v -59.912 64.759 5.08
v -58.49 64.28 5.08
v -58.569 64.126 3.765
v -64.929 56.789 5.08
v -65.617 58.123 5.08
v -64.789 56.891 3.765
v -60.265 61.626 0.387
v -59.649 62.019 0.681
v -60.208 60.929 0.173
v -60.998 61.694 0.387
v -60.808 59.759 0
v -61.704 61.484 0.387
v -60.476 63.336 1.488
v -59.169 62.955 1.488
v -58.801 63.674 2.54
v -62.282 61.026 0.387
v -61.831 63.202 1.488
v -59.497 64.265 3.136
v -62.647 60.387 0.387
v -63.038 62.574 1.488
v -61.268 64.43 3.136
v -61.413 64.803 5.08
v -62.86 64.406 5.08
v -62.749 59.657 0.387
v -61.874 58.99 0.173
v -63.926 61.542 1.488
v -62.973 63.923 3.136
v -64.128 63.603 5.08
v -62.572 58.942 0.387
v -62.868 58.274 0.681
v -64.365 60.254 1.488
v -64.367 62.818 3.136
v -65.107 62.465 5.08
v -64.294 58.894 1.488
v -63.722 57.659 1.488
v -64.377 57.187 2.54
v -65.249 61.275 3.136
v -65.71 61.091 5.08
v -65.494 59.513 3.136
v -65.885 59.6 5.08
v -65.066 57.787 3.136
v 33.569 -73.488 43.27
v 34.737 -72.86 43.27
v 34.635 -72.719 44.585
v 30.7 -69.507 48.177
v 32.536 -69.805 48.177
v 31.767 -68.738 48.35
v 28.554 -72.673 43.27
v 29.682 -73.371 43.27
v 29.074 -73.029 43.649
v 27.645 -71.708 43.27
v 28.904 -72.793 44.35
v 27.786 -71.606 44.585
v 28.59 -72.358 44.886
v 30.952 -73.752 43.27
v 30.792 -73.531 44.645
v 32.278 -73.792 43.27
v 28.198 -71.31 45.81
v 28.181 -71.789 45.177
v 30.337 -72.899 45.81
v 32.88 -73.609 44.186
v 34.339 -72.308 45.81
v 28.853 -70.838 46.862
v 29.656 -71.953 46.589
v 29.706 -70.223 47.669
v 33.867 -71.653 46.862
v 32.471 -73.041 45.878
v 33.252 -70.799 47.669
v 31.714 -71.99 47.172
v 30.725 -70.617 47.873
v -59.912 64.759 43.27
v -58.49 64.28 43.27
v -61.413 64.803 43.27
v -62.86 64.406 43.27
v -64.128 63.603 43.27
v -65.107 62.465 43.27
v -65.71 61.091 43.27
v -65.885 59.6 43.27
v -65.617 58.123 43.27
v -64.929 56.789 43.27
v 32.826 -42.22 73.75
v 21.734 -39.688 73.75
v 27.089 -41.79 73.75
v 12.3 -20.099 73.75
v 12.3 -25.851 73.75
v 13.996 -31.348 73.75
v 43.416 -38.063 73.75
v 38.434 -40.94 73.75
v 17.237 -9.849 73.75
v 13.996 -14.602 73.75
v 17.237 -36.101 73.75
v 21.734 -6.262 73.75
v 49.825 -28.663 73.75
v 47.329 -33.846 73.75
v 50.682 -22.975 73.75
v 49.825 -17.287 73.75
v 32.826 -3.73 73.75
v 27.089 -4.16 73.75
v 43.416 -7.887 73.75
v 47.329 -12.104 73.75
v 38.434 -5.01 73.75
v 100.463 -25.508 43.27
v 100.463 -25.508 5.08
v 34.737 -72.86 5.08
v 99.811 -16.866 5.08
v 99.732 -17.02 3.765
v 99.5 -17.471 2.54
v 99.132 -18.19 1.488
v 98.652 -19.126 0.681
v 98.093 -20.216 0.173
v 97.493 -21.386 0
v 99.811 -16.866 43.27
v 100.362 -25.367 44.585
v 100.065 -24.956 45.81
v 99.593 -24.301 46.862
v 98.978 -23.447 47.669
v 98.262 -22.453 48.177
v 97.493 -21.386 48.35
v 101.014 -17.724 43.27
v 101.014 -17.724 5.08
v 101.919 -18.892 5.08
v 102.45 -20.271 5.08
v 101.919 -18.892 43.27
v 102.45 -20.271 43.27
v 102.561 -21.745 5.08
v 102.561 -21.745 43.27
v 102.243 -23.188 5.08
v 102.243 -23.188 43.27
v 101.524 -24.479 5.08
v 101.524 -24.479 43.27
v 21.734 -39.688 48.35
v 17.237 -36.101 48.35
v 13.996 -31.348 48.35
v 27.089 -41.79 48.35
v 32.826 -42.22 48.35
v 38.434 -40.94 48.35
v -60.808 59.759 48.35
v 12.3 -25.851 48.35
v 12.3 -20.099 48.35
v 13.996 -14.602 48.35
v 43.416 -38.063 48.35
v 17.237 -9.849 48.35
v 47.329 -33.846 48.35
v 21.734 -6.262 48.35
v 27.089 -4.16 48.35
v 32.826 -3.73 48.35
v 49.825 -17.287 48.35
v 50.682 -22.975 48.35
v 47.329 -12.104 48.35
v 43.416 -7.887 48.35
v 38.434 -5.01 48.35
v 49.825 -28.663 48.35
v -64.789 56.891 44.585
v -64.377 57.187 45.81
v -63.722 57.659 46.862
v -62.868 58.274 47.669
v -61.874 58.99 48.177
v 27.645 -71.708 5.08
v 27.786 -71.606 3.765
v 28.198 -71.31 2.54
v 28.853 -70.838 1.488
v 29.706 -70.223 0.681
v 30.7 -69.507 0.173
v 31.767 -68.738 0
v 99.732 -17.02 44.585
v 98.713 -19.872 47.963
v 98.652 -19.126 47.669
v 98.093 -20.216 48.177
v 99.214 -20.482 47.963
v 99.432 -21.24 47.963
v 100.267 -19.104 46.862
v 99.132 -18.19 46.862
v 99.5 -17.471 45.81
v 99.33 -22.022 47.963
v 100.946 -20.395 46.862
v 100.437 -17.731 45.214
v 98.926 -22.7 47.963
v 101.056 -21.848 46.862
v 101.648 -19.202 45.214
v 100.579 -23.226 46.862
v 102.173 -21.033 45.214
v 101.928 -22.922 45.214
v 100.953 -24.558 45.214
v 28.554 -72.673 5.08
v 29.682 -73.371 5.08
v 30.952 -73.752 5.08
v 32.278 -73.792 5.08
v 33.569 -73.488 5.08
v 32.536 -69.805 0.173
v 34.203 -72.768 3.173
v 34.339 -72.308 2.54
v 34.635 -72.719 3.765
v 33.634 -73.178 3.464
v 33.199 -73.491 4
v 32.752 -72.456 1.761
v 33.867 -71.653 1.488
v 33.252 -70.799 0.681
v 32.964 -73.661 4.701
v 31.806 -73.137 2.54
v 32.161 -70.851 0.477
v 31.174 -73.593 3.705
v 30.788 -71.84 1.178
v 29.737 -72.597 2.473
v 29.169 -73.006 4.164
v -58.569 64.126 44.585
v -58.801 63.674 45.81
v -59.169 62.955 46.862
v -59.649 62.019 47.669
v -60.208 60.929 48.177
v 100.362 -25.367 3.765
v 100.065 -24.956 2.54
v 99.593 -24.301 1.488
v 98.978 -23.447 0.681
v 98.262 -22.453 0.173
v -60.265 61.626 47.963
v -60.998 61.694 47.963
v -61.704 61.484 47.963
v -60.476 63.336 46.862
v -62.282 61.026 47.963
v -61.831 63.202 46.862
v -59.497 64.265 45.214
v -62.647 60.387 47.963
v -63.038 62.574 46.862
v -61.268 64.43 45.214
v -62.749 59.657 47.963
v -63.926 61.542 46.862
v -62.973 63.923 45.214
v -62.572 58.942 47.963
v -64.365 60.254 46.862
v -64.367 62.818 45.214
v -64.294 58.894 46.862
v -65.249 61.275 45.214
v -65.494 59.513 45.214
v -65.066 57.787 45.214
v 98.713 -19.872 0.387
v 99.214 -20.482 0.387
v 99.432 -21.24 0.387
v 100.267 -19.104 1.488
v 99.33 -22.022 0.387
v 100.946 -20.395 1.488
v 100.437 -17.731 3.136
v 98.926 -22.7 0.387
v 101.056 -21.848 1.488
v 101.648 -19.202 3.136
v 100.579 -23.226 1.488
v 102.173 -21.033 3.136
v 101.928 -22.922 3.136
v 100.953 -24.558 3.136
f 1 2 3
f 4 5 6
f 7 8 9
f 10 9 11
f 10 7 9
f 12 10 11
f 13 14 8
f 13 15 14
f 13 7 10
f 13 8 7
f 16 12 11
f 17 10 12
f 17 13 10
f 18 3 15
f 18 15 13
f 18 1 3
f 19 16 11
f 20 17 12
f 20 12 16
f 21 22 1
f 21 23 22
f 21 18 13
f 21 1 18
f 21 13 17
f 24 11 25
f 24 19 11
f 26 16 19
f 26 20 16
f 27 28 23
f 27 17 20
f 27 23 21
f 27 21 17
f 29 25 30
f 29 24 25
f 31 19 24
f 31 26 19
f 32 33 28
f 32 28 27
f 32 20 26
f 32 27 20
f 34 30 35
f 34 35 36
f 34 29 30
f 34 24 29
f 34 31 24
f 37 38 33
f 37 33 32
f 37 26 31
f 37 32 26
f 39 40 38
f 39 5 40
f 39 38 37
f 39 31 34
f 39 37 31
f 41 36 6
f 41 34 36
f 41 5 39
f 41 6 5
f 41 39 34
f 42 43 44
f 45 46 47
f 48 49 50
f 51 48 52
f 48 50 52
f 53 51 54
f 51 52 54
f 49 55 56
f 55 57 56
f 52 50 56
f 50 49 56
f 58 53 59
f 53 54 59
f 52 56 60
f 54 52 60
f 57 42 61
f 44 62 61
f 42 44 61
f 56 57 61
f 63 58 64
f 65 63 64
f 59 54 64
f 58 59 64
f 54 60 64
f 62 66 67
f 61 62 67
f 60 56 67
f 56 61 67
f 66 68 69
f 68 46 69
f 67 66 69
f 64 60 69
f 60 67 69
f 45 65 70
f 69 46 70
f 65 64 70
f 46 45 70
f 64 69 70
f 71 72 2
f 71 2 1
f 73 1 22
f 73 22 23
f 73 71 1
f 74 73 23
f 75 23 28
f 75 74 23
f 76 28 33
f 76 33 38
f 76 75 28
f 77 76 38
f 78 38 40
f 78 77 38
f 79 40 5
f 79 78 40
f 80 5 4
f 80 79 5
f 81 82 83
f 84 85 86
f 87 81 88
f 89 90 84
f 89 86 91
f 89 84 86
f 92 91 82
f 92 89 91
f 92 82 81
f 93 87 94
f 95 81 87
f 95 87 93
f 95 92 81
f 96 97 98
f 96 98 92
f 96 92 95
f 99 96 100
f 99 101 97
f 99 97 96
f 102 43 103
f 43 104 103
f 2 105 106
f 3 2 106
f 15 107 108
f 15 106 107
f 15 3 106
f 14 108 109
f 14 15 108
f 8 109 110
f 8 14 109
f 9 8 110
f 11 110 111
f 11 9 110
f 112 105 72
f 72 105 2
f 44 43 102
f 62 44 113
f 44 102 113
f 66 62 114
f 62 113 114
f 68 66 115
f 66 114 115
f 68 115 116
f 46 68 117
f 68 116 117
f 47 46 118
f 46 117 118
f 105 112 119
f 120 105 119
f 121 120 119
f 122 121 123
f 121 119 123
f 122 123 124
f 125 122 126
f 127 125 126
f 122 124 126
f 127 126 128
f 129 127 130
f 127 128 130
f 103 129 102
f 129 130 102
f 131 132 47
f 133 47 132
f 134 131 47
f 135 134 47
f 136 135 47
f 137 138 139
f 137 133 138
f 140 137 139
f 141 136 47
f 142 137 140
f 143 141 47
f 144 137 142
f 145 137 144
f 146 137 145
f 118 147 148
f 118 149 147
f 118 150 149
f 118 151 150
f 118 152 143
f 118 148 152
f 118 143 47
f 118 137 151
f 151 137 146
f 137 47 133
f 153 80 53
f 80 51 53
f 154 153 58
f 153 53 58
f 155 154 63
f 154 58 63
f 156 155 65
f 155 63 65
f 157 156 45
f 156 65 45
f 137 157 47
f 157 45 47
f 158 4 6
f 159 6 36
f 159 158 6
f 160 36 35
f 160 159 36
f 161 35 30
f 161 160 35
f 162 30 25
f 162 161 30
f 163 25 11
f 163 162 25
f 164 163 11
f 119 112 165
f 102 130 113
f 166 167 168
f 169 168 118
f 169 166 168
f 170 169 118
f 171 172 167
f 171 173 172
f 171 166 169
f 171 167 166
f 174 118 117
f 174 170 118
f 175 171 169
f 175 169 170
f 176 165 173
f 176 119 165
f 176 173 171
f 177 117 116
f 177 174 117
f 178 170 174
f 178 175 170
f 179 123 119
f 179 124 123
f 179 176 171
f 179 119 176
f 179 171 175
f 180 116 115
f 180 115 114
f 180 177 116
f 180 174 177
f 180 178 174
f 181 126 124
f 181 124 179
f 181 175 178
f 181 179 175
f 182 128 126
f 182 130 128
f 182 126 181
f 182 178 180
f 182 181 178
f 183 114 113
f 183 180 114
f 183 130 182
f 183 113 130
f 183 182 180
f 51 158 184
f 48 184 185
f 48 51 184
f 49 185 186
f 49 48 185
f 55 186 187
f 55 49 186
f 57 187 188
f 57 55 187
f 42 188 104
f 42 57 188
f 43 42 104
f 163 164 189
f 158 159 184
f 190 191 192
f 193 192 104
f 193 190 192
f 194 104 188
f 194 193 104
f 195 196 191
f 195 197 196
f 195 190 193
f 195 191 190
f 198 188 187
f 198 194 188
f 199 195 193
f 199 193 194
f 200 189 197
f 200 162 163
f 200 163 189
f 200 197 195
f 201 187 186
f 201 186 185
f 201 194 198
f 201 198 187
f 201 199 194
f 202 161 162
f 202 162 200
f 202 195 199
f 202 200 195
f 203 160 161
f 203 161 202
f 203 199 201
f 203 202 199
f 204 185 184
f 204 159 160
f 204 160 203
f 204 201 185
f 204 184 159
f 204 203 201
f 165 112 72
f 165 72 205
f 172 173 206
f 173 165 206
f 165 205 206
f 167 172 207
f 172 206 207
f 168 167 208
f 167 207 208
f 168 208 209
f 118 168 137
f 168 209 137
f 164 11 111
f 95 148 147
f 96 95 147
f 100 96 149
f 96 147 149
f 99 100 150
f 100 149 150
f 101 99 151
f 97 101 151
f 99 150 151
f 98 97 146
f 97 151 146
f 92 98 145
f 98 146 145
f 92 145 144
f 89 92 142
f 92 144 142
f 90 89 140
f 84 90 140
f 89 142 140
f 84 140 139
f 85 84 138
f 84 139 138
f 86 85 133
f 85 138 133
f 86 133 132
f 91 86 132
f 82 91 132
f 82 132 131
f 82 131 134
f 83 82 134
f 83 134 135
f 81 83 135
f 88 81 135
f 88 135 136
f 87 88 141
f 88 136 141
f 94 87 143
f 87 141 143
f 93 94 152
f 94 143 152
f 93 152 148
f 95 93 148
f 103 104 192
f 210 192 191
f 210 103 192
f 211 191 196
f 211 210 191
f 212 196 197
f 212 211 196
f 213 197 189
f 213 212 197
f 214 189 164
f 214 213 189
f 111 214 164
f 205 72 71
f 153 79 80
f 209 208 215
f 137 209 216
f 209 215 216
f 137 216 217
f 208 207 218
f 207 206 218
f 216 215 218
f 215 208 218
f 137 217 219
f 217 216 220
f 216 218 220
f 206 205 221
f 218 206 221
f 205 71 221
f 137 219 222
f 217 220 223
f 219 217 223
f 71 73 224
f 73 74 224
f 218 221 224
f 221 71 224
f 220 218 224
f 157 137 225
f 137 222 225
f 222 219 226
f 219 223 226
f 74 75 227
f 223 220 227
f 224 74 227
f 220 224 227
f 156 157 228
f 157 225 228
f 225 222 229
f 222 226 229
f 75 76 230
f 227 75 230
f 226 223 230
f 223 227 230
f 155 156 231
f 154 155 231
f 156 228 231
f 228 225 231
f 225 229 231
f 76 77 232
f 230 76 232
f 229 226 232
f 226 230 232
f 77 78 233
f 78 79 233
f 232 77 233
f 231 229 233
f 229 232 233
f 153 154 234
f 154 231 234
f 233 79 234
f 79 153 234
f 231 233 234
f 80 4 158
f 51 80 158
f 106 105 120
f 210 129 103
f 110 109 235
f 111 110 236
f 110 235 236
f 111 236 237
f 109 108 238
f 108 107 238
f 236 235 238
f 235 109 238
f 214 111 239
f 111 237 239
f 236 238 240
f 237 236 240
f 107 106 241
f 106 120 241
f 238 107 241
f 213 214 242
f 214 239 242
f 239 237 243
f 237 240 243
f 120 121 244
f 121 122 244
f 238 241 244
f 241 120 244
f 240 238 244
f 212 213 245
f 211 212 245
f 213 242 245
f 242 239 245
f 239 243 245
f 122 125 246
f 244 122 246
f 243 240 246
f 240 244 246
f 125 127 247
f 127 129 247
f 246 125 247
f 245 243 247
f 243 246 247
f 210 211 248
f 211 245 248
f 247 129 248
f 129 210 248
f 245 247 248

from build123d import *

# Parameters (mm, degrees)
F1_DEPTH = 48.350064
F2_R     = 5.08
F4_R     = 19.298697
F5_DEPTH = 25.4


with BuildPart() as f1:
    # F0 (on Top) → F1 (new body)
    with BuildSketch(Plane.XY):
        Polygon((107.200803, -20.653679), (-77.255428, 73.898613), (30.614838, -75.829387), align=None)
    extrude(amount=F1_DEPTH)

    # F2
    f2_edges = [f1.edges().sort_by_distance(p)[0] for p in [
        (-77.255428, 73.898613, 24.175032),
        (68.90782, -48.241533, 48.350064),
        (107.200803, -20.653679, 24.175032),
        (14.972687, 26.622467, 0),
        (14.972687, 26.622467, 48.350064),
        (-23.320295, -0.965387, 0),
        (68.90782, -48.241533, 0),
        (30.614838, -75.829387, 24.175032),
        (-23.320295, -0.965387, 48.350064),
    ]]
    fillet(f2_edges, radius=F2_R)

    # F4 (on face) → F5 (join)
    with BuildSketch(Plane.XY.offset(48.350064)):
        with Locations((31.383455, -22.975024)):
            Circle(F4_R)
    extrude(amount=F5_DEPTH)


solid = f1.part
